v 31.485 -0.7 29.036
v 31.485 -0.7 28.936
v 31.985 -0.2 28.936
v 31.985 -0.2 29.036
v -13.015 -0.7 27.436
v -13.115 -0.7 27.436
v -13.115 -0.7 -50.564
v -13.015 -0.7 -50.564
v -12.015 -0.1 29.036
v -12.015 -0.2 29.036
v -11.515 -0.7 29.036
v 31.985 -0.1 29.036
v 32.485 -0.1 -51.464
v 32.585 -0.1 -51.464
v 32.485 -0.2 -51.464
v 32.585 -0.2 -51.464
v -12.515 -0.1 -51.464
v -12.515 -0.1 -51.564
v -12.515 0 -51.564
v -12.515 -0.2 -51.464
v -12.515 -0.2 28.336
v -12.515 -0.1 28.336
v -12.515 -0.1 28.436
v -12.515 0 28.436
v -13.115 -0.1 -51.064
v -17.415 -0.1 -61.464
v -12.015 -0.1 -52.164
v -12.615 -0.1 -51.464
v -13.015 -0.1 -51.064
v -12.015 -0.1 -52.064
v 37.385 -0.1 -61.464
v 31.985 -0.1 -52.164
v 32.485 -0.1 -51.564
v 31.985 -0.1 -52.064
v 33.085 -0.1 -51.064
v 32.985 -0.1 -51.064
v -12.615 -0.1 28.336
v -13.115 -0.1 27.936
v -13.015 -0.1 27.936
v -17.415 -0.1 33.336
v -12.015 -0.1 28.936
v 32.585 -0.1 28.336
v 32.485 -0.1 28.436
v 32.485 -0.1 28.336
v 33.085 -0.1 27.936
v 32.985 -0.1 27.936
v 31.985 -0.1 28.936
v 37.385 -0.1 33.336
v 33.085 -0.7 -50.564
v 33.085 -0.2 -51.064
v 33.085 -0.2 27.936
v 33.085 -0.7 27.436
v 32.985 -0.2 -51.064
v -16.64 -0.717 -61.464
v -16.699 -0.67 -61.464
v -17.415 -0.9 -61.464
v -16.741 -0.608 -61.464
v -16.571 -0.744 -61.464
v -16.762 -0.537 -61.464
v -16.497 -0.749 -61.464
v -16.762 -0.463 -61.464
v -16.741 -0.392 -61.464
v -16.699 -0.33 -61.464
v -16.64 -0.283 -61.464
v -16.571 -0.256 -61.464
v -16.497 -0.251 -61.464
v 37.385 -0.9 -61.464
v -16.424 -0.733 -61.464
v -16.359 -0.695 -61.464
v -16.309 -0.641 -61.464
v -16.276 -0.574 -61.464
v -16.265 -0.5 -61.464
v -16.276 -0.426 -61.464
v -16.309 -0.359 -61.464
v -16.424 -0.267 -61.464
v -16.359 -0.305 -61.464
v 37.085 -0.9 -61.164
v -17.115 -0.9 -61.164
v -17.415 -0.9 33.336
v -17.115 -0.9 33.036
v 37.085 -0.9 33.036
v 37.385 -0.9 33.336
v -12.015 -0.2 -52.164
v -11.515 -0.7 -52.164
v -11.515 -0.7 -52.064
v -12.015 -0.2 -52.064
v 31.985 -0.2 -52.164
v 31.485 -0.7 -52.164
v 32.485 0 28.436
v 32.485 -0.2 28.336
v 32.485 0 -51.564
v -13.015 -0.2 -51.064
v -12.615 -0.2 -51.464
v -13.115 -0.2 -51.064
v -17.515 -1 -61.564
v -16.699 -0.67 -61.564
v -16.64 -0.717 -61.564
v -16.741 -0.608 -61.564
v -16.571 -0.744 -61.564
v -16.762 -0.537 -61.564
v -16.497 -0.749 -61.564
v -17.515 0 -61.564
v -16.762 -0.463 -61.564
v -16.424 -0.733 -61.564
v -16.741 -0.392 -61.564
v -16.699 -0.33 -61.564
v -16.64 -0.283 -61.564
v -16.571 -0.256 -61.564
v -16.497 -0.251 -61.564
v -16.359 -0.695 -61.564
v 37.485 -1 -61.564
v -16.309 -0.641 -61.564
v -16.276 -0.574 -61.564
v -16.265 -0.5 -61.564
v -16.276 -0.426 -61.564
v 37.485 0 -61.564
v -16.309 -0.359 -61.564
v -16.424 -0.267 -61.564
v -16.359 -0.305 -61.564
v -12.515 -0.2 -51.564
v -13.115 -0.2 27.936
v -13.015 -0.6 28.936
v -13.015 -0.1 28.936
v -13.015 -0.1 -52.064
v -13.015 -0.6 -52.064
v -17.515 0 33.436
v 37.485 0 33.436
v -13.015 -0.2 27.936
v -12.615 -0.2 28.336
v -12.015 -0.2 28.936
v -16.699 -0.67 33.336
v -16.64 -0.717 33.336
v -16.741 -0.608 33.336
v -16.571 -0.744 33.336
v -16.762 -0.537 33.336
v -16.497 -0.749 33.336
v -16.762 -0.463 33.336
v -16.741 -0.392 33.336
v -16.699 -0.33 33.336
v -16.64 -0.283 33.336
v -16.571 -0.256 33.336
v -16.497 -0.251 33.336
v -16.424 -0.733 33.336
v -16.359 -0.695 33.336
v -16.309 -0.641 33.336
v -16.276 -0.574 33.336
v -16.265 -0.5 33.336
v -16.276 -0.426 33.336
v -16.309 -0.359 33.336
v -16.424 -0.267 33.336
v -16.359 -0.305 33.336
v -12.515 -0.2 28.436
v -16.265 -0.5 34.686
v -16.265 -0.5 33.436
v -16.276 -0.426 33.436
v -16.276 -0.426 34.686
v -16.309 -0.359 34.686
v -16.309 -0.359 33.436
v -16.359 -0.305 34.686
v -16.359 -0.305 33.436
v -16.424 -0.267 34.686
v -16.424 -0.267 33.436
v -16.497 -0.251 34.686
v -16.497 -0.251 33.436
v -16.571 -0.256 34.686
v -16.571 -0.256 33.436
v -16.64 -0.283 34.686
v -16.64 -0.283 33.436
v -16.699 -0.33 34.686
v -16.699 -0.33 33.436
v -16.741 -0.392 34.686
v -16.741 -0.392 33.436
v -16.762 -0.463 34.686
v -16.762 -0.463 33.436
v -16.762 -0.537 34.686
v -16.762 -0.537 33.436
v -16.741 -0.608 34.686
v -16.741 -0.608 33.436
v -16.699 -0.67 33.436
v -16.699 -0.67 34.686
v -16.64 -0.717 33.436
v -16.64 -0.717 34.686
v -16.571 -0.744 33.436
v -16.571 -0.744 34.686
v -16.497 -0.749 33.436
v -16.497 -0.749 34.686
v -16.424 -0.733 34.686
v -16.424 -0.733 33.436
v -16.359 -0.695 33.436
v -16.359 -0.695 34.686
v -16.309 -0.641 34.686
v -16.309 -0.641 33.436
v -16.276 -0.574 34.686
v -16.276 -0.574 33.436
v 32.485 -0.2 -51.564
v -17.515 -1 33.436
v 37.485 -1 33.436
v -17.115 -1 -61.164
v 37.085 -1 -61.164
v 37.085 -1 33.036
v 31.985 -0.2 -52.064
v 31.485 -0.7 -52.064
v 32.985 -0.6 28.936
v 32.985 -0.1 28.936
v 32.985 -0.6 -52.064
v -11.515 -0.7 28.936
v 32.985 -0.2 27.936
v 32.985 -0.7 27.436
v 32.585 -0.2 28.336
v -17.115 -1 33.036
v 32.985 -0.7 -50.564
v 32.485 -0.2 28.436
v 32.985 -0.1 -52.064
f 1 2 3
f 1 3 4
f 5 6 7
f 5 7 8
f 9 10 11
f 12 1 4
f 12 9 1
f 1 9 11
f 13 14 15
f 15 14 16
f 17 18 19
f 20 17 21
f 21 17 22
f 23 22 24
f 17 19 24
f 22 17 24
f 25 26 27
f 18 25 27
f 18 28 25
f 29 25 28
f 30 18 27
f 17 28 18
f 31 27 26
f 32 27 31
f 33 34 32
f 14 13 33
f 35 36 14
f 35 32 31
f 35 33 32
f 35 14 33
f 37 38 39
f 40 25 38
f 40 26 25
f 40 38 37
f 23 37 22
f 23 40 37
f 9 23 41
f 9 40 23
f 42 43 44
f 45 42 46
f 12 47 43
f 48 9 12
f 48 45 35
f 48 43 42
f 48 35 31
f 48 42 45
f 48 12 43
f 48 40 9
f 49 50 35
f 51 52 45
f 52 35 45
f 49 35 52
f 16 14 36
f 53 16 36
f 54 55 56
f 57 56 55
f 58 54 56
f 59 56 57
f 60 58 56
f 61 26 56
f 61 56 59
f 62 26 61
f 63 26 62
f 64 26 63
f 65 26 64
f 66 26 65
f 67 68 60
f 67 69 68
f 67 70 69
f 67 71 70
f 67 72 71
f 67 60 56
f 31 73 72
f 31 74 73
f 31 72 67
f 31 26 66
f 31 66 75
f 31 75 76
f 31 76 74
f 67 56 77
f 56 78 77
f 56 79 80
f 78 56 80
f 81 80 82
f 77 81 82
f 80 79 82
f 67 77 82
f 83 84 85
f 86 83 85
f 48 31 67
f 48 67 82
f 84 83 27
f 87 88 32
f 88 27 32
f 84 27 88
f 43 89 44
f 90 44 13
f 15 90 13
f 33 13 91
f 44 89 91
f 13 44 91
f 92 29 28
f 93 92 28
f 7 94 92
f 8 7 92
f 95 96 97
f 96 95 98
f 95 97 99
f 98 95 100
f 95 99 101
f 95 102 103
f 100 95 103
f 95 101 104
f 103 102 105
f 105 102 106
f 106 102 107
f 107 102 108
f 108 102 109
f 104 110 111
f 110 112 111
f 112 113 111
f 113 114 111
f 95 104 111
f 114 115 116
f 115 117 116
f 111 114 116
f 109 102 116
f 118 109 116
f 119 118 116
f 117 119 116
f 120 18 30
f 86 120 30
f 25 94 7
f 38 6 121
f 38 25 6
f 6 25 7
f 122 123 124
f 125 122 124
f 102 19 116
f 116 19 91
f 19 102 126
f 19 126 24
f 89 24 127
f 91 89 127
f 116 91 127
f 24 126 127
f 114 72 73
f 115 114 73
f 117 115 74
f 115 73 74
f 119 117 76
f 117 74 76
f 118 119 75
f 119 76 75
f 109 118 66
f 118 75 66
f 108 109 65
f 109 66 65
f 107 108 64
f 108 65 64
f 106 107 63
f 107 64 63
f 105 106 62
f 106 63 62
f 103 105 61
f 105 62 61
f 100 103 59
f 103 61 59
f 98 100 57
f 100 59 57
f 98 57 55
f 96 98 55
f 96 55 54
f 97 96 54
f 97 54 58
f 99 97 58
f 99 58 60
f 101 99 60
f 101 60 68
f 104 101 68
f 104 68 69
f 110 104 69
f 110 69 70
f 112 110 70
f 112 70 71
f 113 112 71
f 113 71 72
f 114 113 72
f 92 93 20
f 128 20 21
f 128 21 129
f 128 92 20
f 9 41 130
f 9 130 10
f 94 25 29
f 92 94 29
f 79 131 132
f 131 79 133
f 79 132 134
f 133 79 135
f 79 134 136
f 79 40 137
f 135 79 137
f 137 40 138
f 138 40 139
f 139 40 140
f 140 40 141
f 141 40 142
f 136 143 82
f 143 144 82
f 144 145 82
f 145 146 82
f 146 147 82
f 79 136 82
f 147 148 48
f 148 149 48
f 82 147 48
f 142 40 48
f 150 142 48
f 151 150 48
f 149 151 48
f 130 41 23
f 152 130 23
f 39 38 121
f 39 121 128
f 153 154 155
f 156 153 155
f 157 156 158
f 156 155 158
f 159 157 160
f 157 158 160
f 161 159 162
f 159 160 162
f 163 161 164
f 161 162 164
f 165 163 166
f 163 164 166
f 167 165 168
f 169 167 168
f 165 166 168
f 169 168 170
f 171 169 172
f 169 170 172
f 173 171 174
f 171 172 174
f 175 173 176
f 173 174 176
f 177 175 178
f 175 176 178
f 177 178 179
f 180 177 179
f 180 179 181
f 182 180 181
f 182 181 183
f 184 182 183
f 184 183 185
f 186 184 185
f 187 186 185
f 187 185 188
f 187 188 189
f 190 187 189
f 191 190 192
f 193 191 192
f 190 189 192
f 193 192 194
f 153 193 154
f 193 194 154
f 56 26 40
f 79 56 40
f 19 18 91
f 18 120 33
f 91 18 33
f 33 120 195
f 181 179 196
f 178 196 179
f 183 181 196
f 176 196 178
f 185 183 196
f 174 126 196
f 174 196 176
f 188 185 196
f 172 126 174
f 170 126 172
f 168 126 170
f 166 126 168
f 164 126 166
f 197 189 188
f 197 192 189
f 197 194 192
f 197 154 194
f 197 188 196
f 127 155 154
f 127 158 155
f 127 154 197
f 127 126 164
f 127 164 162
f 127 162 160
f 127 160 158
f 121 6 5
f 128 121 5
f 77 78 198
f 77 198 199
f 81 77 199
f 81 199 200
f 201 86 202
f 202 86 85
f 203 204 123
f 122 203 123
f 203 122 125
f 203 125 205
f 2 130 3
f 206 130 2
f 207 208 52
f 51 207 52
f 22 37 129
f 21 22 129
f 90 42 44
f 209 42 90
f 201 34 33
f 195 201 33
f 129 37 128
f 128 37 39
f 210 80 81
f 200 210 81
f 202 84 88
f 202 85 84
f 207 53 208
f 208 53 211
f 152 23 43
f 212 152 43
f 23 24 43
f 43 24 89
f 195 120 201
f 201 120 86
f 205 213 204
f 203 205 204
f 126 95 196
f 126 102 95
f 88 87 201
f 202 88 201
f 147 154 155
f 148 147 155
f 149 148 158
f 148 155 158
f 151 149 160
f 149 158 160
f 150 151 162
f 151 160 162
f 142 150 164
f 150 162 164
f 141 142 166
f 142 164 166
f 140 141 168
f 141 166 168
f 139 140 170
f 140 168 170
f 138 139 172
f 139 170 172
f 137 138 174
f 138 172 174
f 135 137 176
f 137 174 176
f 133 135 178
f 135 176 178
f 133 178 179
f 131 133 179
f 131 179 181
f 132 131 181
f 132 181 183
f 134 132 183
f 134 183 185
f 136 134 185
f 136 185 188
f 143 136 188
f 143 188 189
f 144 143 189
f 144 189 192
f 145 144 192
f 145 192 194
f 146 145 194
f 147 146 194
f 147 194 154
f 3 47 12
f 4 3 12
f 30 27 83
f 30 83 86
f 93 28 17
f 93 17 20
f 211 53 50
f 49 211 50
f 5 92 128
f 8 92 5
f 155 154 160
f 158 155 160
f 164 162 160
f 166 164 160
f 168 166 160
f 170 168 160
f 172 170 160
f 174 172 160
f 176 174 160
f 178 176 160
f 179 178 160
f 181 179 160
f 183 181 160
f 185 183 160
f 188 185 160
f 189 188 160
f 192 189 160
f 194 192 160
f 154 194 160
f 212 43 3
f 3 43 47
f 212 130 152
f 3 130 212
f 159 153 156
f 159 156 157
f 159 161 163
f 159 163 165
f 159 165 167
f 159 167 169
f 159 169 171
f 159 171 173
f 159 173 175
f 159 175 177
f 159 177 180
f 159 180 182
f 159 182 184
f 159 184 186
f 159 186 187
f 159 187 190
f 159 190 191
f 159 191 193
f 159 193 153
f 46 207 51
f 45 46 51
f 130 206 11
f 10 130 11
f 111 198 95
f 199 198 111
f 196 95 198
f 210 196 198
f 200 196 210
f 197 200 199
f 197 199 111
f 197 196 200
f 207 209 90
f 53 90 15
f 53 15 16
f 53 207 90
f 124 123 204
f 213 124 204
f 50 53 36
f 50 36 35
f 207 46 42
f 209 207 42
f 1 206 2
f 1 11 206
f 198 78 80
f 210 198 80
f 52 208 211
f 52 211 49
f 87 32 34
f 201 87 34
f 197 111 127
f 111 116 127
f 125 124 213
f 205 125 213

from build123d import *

# Parameters (mm, degrees)
F0_W      = 57
F0_H      = 97
F1_DEPTH  = 0.1
F2_R      = 0.25
F2_W      = 0.7
F2_H      = 0.7
F2_W_2    = 42.3999996498
F2_H_2    = 77.4
F3_DEPTH  = 25
F2_W_3    = 55
F2_H_3    = 95
F2_W_4    = 54.8
F2_H_4    = 94.8
F4_DEPTH  = 0.8
F5_R      = 0.25
F6_DEPTH  = 100
F7_DEPTH  = 25
F8_W      = 55
F8_H      = 95
F8_W_2    = 54.8
F8_H_2    = 94.8
F8_W_3    = 54.2
F8_H_3    = 94.2
F9_DEPTH  = 0.1
F10_W     = 44.9999996498
F10_H     = 80
F10_W_2   = 42.3999996498
F10_H_2   = 77.4
F11_DEPTH = 25
F10_W_3   = 43.9999996498
F10_H_3   = 0.1
F10_W_4   = 0.1
F10_H_4   = 79
F14_DEPTH = 0.6
F15_DEPTH = 0.1
F16_DEPTH = 0.1
F17_DEPTH = 0.1
F18_SIZE  = 0.5
F19_DEPTH = 0.5
F20_DEPTH = 1.25


with BuildPart() as f1:
    # F0 (on Front) → F1 (new body)
    with BuildSketch(Plane.XZ):
        with Locations((9.9847369492, -14.063598156)):
            Rectangle(F0_W, F0_H)
    extrude(amount=F1_DEPTH)

    # F2 (on face) → F3 (cut)
    with BuildSketch(Plane.XZ.offset(0.1)):
        with Locations((-16.5152630508, 33.786401844)):
            Circle(F2_R)
        with Locations((-16.5152630508, -61.913598156)):
            Circle(F2_R)
        with Locations((-17.8652630508, -61.913598156)):
            Rectangle(F2_W, F2_H)
        Polygon((-18.2152630508, -62.263598156), (-18.2152630508, -61.563598156), (-18.5152630508, -61.563598156), (-18.5152630508, -62.563598156), (-17.5152630508, -62.563598156), (-17.5152630508, -62.263598156), align=None)
        Polygon((-18.2152630508, 33.436401844), (-18.2152630508, 34.136401844), (-17.5152630508, 34.136401844), (-17.5152630508, 34.436401844), (-18.5152630508, 34.436401844), (-18.5152630508, 33.436401844), align=None)
        with Locations((-17.8652630508, 33.786401844)):
            Rectangle(F2_W, F2_H)
        Polygon((37.4847369492, 34.436401844), (37.4847369492, 34.136401844), (38.1847369492, 34.136401844), (38.1847369492, 33.436401844), (38.4847369492, 33.436401844), (38.4847369492, 34.436401844), align=None)
        with Locations((37.8347369492, 33.786401844)):
            Rectangle(F2_W, F2_H)
        Polygon((38.4847369492, -61.563598156), (38.1847369492, -61.563598156), (38.1847369492, -62.263598156), (37.4847369492, -62.263598156), (37.4847369492, -62.563598156), (38.4847369492, -62.563598156), align=None)
        with Locations((37.8347369492, -61.913598156)):
            Rectangle(F2_W, F2_H)
        with Locations((9.9847371243, -11.563598156)):
            Rectangle(F2_W_2, F2_H_2)
    extrude(amount=-F3_DEPTH, mode=Mode.SUBTRACT)

    # F2 (on face) → F4 (join)
    with BuildSketch(Plane.XZ.offset(0.1)):
        with Locations((9.9847369492, -14.063598156)):
            Rectangle(F2_W_3, F2_H_3)
        with Locations((9.9847369492, -14.063598156)):
            Rectangle(F2_W_4, F2_H_4, mode=Mode.SUBTRACT)
    extrude(amount=F4_DEPTH)

    # F5 (on face) → F6 (cut)
    with BuildSketch(Plane.XY.offset(33.436401844)):
        with Locations((-16.5152630508, -0.5)):
            Circle(F5_R)
    extrude(amount=-F6_DEPTH, mode=Mode.SUBTRACT)

    # F7 (cut): faces of the model
    f7_faces = [f1.faces().sort_by_distance(p)[0] for p in [
        (-18.0152630508, -0.1, -14.063598156),
        (10.0796806763, -0.1, 33.9369392613),
        (37.9847369492, -0.1, -14.063598156),
        (10.0796806763, -0.1, -62.0641355733),
    ]]
    extrude(f7_faces, amount=-F7_DEPTH, mode=Mode.SUBTRACT)

    # F8 (on face) → F9 (join)
    with BuildSketch(Plane.XZ.offset(0.9)):
        with Locations((9.9847369492, -14.063598156)):
            Rectangle(F8_W, F8_H)
        with Locations((9.9847369492, -14.063598156)):
            Rectangle(F8_W_2, F8_H_2, mode=Mode.SUBTRACT)
        with Locations((9.9847369492, -14.063598156)):
            Rectangle(F8_W_2, F8_H_2)
        with Locations((9.9847369492, -14.063598156)):
            Rectangle(F8_W_3, F8_H_3, mode=Mode.SUBTRACT)
    extrude(amount=F9_DEPTH)

    # F10 (on face) → F11 (cut)
    with BuildSketch(Plane.XZ.offset(0.1)):
        with Locations((9.9847371243, -11.563598156)):
            Rectangle(F10_W, F10_H)
        with Locations((9.9847371243, -11.563598156)):
            Rectangle(F10_W_2, F10_H_2, mode=Mode.SUBTRACT)
    extrude(amount=-F11_DEPTH, mode=Mode.SUBTRACT)

    # F10 (on face) → F14 (join)
    with BuildSketch(Plane.XZ.offset(0.1)):
        with Locations((9.9847371243, -52.113598156)):
            Rectangle(F10_W_3, F10_H_3)
        with Locations((33.0347369492, -11.563598156)):
            Rectangle(F10_W_4, F10_H_4)
        with Locations((-13.0652627006, -11.563598156)):
            Rectangle(F10_W_4, F10_H_4)
        with Locations((9.9847371243, 28.986401844)):
            Rectangle(F10_W_3, F10_H_3)
    extrude(amount=F14_DEPTH)

    # F10 (on face) → F15 (join)
    with BuildSketch(Plane.XZ.offset(0.1)):
        Polygon((-12.4152627006, 28.536401844), (-12.5152627006, 28.436401844), (32.4847369492, 28.436401844), (32.3847369492, 28.536401844), align=None)
        Polygon((-12.0152627006, 28.936401844), (-12.4152627006, 28.536401844), (32.3847369492, 28.536401844), (31.9847369492, 28.936401844), align=None)
        Polygon((32.9847369492, 27.936401844), (32.5847369492, 28.336401844), (32.5847369492, -51.463598156), (32.9847369492, -51.063598156), align=None)
        Polygon((-12.6152627006, -51.463598156), (-12.6152627006, 28.336401844), (-13.0152627006, 27.936401844), (-13.0152627006, -51.063598156), align=None)
        Polygon((32.3847369492, -51.663598156), (-12.4152627006, -51.663598156), (-12.0152627006, -52.063598156), (31.9847369492, -52.063598156), align=None)
        Polygon((32.4847369492, -51.563598156), (-12.5152627006, -51.563598156), (-12.4152627006, -51.663598156), (32.3847369492, -51.663598156), align=None)
    extrude(amount=F15_DEPTH)

    # F16 (add): a face of the model
    f16_faces = [f1.faces().sort_by_distance(p)[0] for p in [
        (-12.6152627006, -0.15, -11.563598156),
    ]]
    extrude(f16_faces, amount=F16_DEPTH)

    # F17 (add): a face of the model
    f17_faces = [f1.faces().sort_by_distance(p)[0] for p in [
        (32.5847369492, -0.15, -11.563598156),
    ]]
    extrude(f17_faces, amount=F17_DEPTH)

    # F18
    f18_edges = [f1.edges().sort_by_distance(p)[0] for p in [
        (33.034737, -0.7, -51.063598),
        (31.984737, -0.7, -52.113598),
        (-13.065263, -0.7, -51.063598),
        (-12.015263, -0.7, -52.113598),
        (-12.015263, -0.7, 28.986402),
        (-13.065263, -0.7, 27.936402),
        (31.984737, -0.7, 28.986402),
        (33.034737, -0.7, 27.936402),
    ]]
    chamfer(f18_edges, length=F18_SIZE)


with BuildPart() as f19:
    # F10 (on face) → F19 (new body)
    with BuildSketch(Plane.XZ.offset(0.1)):
        Polygon((-12.6152627006, 28.536401844), (-12.4152627006, 28.536401844), (-12.0152627006, 28.936401844), (-13.0152627006, 28.936401844), (-13.0152627006, 27.936401844), (-12.6152627006, 28.336401844), align=None)
        Polygon((-12.6152627006, 28.336401844), (-12.5152627006, 28.436401844), (-12.4152627006, 28.536401844), (-12.6152627006, 28.536401844), align=None)
        Polygon((-12.0152627006, 28.936401844), (-12.4152627006, 28.536401844), (32.3847369492, 28.536401844), (31.9847369492, 28.936401844), align=None)
        Polygon((-12.6152627006, -51.463598156), (-12.6152627006, 28.336401844), (-13.0152627006, 27.936401844), (-13.0152627006, -51.063598156), align=None)
        Polygon((-12.4152627006, 28.536401844), (-12.5152627006, 28.436401844), (32.4847369492, 28.436401844), (32.3847369492, 28.536401844), align=None)
        Polygon((-12.5152627006, -51.563598156), (-12.5152627006, 28.436401844), (-12.6152627006, 28.336401844), (-12.6152627006, -51.463598156), align=None)
        with Locations((9.9847371243, -11.563598156)):
            Rectangle(F10_W, F10_H)
        with Locations((9.9847371243, -11.563598156)):
            Rectangle(F10_W_2, F10_H_2, mode=Mode.SUBTRACT)
        with Locations((9.9847371243, -11.563598156)):
            Rectangle(F10_W_2, F10_H_2)
        Polygon((31.9847369492, 28.936401844), (32.3847369492, 28.536401844), (32.5847369492, 28.536401844), (32.5847369492, 28.336401844), (32.9847369492, 27.936401844), (32.9847369492, 28.936401844), align=None)
        Polygon((32.3847369492, 28.536401844), (32.4847369492, 28.436401844), (32.5847369492, 28.336401844), (32.5847369492, 28.536401844), align=None)
        Polygon((32.5847369492, 28.336401844), (32.4847369492, 28.436401844), (32.4847369492, -51.563598156), (32.5847369492, -51.463598156), align=None)
        Polygon((32.9847369492, 27.936401844), (32.5847369492, 28.336401844), (32.5847369492, -51.463598156), (32.9847369492, -51.063598156), align=None)
        Polygon((32.5847369492, -51.463598156), (32.4847369492, -51.563598156), (32.3847369492, -51.663598156), (32.5847369492, -51.663598156), align=None)
        Polygon((32.5847369492, -51.663598156), (32.3847369492, -51.663598156), (31.9847369492, -52.063598156), (32.9847369492, -52.063598156), (32.9847369492, -51.063598156), (32.5847369492, -51.463598156), align=None)
        Polygon((32.4847369492, -51.563598156), (-12.5152627006, -51.563598156), (-12.4152627006, -51.663598156), (32.3847369492, -51.663598156), align=None)
        Polygon((32.3847369492, -51.663598156), (-12.4152627006, -51.663598156), (-12.0152627006, -52.063598156), (31.9847369492, -52.063598156), align=None)
        Polygon((-12.4152627006, -51.663598156), (-12.5152627006, -51.563598156), (-12.6152627006, -51.463598156), (-12.6152627006, -51.663598156), align=None)
        Polygon((-12.6152627006, -51.663598156), (-12.6152627006, -51.463598156), (-13.0152627006, -51.063598156), (-13.0152627006, -52.063598156), (-12.0152627006, -52.063598156), (-12.4152627006, -51.663598156), align=None)
    extrude(amount=F19_DEPTH)


with BuildPart() as f20:
    # F5 (on face) → F20 (new body)
    with BuildSketch(Plane.XY.offset(33.436401844)):
        with Locations((-16.5152630508, -0.5)):
            Circle(F5_R)
    extrude(amount=F20_DEPTH)


solid = Compound([f1.part, f19.part, f20.part])
